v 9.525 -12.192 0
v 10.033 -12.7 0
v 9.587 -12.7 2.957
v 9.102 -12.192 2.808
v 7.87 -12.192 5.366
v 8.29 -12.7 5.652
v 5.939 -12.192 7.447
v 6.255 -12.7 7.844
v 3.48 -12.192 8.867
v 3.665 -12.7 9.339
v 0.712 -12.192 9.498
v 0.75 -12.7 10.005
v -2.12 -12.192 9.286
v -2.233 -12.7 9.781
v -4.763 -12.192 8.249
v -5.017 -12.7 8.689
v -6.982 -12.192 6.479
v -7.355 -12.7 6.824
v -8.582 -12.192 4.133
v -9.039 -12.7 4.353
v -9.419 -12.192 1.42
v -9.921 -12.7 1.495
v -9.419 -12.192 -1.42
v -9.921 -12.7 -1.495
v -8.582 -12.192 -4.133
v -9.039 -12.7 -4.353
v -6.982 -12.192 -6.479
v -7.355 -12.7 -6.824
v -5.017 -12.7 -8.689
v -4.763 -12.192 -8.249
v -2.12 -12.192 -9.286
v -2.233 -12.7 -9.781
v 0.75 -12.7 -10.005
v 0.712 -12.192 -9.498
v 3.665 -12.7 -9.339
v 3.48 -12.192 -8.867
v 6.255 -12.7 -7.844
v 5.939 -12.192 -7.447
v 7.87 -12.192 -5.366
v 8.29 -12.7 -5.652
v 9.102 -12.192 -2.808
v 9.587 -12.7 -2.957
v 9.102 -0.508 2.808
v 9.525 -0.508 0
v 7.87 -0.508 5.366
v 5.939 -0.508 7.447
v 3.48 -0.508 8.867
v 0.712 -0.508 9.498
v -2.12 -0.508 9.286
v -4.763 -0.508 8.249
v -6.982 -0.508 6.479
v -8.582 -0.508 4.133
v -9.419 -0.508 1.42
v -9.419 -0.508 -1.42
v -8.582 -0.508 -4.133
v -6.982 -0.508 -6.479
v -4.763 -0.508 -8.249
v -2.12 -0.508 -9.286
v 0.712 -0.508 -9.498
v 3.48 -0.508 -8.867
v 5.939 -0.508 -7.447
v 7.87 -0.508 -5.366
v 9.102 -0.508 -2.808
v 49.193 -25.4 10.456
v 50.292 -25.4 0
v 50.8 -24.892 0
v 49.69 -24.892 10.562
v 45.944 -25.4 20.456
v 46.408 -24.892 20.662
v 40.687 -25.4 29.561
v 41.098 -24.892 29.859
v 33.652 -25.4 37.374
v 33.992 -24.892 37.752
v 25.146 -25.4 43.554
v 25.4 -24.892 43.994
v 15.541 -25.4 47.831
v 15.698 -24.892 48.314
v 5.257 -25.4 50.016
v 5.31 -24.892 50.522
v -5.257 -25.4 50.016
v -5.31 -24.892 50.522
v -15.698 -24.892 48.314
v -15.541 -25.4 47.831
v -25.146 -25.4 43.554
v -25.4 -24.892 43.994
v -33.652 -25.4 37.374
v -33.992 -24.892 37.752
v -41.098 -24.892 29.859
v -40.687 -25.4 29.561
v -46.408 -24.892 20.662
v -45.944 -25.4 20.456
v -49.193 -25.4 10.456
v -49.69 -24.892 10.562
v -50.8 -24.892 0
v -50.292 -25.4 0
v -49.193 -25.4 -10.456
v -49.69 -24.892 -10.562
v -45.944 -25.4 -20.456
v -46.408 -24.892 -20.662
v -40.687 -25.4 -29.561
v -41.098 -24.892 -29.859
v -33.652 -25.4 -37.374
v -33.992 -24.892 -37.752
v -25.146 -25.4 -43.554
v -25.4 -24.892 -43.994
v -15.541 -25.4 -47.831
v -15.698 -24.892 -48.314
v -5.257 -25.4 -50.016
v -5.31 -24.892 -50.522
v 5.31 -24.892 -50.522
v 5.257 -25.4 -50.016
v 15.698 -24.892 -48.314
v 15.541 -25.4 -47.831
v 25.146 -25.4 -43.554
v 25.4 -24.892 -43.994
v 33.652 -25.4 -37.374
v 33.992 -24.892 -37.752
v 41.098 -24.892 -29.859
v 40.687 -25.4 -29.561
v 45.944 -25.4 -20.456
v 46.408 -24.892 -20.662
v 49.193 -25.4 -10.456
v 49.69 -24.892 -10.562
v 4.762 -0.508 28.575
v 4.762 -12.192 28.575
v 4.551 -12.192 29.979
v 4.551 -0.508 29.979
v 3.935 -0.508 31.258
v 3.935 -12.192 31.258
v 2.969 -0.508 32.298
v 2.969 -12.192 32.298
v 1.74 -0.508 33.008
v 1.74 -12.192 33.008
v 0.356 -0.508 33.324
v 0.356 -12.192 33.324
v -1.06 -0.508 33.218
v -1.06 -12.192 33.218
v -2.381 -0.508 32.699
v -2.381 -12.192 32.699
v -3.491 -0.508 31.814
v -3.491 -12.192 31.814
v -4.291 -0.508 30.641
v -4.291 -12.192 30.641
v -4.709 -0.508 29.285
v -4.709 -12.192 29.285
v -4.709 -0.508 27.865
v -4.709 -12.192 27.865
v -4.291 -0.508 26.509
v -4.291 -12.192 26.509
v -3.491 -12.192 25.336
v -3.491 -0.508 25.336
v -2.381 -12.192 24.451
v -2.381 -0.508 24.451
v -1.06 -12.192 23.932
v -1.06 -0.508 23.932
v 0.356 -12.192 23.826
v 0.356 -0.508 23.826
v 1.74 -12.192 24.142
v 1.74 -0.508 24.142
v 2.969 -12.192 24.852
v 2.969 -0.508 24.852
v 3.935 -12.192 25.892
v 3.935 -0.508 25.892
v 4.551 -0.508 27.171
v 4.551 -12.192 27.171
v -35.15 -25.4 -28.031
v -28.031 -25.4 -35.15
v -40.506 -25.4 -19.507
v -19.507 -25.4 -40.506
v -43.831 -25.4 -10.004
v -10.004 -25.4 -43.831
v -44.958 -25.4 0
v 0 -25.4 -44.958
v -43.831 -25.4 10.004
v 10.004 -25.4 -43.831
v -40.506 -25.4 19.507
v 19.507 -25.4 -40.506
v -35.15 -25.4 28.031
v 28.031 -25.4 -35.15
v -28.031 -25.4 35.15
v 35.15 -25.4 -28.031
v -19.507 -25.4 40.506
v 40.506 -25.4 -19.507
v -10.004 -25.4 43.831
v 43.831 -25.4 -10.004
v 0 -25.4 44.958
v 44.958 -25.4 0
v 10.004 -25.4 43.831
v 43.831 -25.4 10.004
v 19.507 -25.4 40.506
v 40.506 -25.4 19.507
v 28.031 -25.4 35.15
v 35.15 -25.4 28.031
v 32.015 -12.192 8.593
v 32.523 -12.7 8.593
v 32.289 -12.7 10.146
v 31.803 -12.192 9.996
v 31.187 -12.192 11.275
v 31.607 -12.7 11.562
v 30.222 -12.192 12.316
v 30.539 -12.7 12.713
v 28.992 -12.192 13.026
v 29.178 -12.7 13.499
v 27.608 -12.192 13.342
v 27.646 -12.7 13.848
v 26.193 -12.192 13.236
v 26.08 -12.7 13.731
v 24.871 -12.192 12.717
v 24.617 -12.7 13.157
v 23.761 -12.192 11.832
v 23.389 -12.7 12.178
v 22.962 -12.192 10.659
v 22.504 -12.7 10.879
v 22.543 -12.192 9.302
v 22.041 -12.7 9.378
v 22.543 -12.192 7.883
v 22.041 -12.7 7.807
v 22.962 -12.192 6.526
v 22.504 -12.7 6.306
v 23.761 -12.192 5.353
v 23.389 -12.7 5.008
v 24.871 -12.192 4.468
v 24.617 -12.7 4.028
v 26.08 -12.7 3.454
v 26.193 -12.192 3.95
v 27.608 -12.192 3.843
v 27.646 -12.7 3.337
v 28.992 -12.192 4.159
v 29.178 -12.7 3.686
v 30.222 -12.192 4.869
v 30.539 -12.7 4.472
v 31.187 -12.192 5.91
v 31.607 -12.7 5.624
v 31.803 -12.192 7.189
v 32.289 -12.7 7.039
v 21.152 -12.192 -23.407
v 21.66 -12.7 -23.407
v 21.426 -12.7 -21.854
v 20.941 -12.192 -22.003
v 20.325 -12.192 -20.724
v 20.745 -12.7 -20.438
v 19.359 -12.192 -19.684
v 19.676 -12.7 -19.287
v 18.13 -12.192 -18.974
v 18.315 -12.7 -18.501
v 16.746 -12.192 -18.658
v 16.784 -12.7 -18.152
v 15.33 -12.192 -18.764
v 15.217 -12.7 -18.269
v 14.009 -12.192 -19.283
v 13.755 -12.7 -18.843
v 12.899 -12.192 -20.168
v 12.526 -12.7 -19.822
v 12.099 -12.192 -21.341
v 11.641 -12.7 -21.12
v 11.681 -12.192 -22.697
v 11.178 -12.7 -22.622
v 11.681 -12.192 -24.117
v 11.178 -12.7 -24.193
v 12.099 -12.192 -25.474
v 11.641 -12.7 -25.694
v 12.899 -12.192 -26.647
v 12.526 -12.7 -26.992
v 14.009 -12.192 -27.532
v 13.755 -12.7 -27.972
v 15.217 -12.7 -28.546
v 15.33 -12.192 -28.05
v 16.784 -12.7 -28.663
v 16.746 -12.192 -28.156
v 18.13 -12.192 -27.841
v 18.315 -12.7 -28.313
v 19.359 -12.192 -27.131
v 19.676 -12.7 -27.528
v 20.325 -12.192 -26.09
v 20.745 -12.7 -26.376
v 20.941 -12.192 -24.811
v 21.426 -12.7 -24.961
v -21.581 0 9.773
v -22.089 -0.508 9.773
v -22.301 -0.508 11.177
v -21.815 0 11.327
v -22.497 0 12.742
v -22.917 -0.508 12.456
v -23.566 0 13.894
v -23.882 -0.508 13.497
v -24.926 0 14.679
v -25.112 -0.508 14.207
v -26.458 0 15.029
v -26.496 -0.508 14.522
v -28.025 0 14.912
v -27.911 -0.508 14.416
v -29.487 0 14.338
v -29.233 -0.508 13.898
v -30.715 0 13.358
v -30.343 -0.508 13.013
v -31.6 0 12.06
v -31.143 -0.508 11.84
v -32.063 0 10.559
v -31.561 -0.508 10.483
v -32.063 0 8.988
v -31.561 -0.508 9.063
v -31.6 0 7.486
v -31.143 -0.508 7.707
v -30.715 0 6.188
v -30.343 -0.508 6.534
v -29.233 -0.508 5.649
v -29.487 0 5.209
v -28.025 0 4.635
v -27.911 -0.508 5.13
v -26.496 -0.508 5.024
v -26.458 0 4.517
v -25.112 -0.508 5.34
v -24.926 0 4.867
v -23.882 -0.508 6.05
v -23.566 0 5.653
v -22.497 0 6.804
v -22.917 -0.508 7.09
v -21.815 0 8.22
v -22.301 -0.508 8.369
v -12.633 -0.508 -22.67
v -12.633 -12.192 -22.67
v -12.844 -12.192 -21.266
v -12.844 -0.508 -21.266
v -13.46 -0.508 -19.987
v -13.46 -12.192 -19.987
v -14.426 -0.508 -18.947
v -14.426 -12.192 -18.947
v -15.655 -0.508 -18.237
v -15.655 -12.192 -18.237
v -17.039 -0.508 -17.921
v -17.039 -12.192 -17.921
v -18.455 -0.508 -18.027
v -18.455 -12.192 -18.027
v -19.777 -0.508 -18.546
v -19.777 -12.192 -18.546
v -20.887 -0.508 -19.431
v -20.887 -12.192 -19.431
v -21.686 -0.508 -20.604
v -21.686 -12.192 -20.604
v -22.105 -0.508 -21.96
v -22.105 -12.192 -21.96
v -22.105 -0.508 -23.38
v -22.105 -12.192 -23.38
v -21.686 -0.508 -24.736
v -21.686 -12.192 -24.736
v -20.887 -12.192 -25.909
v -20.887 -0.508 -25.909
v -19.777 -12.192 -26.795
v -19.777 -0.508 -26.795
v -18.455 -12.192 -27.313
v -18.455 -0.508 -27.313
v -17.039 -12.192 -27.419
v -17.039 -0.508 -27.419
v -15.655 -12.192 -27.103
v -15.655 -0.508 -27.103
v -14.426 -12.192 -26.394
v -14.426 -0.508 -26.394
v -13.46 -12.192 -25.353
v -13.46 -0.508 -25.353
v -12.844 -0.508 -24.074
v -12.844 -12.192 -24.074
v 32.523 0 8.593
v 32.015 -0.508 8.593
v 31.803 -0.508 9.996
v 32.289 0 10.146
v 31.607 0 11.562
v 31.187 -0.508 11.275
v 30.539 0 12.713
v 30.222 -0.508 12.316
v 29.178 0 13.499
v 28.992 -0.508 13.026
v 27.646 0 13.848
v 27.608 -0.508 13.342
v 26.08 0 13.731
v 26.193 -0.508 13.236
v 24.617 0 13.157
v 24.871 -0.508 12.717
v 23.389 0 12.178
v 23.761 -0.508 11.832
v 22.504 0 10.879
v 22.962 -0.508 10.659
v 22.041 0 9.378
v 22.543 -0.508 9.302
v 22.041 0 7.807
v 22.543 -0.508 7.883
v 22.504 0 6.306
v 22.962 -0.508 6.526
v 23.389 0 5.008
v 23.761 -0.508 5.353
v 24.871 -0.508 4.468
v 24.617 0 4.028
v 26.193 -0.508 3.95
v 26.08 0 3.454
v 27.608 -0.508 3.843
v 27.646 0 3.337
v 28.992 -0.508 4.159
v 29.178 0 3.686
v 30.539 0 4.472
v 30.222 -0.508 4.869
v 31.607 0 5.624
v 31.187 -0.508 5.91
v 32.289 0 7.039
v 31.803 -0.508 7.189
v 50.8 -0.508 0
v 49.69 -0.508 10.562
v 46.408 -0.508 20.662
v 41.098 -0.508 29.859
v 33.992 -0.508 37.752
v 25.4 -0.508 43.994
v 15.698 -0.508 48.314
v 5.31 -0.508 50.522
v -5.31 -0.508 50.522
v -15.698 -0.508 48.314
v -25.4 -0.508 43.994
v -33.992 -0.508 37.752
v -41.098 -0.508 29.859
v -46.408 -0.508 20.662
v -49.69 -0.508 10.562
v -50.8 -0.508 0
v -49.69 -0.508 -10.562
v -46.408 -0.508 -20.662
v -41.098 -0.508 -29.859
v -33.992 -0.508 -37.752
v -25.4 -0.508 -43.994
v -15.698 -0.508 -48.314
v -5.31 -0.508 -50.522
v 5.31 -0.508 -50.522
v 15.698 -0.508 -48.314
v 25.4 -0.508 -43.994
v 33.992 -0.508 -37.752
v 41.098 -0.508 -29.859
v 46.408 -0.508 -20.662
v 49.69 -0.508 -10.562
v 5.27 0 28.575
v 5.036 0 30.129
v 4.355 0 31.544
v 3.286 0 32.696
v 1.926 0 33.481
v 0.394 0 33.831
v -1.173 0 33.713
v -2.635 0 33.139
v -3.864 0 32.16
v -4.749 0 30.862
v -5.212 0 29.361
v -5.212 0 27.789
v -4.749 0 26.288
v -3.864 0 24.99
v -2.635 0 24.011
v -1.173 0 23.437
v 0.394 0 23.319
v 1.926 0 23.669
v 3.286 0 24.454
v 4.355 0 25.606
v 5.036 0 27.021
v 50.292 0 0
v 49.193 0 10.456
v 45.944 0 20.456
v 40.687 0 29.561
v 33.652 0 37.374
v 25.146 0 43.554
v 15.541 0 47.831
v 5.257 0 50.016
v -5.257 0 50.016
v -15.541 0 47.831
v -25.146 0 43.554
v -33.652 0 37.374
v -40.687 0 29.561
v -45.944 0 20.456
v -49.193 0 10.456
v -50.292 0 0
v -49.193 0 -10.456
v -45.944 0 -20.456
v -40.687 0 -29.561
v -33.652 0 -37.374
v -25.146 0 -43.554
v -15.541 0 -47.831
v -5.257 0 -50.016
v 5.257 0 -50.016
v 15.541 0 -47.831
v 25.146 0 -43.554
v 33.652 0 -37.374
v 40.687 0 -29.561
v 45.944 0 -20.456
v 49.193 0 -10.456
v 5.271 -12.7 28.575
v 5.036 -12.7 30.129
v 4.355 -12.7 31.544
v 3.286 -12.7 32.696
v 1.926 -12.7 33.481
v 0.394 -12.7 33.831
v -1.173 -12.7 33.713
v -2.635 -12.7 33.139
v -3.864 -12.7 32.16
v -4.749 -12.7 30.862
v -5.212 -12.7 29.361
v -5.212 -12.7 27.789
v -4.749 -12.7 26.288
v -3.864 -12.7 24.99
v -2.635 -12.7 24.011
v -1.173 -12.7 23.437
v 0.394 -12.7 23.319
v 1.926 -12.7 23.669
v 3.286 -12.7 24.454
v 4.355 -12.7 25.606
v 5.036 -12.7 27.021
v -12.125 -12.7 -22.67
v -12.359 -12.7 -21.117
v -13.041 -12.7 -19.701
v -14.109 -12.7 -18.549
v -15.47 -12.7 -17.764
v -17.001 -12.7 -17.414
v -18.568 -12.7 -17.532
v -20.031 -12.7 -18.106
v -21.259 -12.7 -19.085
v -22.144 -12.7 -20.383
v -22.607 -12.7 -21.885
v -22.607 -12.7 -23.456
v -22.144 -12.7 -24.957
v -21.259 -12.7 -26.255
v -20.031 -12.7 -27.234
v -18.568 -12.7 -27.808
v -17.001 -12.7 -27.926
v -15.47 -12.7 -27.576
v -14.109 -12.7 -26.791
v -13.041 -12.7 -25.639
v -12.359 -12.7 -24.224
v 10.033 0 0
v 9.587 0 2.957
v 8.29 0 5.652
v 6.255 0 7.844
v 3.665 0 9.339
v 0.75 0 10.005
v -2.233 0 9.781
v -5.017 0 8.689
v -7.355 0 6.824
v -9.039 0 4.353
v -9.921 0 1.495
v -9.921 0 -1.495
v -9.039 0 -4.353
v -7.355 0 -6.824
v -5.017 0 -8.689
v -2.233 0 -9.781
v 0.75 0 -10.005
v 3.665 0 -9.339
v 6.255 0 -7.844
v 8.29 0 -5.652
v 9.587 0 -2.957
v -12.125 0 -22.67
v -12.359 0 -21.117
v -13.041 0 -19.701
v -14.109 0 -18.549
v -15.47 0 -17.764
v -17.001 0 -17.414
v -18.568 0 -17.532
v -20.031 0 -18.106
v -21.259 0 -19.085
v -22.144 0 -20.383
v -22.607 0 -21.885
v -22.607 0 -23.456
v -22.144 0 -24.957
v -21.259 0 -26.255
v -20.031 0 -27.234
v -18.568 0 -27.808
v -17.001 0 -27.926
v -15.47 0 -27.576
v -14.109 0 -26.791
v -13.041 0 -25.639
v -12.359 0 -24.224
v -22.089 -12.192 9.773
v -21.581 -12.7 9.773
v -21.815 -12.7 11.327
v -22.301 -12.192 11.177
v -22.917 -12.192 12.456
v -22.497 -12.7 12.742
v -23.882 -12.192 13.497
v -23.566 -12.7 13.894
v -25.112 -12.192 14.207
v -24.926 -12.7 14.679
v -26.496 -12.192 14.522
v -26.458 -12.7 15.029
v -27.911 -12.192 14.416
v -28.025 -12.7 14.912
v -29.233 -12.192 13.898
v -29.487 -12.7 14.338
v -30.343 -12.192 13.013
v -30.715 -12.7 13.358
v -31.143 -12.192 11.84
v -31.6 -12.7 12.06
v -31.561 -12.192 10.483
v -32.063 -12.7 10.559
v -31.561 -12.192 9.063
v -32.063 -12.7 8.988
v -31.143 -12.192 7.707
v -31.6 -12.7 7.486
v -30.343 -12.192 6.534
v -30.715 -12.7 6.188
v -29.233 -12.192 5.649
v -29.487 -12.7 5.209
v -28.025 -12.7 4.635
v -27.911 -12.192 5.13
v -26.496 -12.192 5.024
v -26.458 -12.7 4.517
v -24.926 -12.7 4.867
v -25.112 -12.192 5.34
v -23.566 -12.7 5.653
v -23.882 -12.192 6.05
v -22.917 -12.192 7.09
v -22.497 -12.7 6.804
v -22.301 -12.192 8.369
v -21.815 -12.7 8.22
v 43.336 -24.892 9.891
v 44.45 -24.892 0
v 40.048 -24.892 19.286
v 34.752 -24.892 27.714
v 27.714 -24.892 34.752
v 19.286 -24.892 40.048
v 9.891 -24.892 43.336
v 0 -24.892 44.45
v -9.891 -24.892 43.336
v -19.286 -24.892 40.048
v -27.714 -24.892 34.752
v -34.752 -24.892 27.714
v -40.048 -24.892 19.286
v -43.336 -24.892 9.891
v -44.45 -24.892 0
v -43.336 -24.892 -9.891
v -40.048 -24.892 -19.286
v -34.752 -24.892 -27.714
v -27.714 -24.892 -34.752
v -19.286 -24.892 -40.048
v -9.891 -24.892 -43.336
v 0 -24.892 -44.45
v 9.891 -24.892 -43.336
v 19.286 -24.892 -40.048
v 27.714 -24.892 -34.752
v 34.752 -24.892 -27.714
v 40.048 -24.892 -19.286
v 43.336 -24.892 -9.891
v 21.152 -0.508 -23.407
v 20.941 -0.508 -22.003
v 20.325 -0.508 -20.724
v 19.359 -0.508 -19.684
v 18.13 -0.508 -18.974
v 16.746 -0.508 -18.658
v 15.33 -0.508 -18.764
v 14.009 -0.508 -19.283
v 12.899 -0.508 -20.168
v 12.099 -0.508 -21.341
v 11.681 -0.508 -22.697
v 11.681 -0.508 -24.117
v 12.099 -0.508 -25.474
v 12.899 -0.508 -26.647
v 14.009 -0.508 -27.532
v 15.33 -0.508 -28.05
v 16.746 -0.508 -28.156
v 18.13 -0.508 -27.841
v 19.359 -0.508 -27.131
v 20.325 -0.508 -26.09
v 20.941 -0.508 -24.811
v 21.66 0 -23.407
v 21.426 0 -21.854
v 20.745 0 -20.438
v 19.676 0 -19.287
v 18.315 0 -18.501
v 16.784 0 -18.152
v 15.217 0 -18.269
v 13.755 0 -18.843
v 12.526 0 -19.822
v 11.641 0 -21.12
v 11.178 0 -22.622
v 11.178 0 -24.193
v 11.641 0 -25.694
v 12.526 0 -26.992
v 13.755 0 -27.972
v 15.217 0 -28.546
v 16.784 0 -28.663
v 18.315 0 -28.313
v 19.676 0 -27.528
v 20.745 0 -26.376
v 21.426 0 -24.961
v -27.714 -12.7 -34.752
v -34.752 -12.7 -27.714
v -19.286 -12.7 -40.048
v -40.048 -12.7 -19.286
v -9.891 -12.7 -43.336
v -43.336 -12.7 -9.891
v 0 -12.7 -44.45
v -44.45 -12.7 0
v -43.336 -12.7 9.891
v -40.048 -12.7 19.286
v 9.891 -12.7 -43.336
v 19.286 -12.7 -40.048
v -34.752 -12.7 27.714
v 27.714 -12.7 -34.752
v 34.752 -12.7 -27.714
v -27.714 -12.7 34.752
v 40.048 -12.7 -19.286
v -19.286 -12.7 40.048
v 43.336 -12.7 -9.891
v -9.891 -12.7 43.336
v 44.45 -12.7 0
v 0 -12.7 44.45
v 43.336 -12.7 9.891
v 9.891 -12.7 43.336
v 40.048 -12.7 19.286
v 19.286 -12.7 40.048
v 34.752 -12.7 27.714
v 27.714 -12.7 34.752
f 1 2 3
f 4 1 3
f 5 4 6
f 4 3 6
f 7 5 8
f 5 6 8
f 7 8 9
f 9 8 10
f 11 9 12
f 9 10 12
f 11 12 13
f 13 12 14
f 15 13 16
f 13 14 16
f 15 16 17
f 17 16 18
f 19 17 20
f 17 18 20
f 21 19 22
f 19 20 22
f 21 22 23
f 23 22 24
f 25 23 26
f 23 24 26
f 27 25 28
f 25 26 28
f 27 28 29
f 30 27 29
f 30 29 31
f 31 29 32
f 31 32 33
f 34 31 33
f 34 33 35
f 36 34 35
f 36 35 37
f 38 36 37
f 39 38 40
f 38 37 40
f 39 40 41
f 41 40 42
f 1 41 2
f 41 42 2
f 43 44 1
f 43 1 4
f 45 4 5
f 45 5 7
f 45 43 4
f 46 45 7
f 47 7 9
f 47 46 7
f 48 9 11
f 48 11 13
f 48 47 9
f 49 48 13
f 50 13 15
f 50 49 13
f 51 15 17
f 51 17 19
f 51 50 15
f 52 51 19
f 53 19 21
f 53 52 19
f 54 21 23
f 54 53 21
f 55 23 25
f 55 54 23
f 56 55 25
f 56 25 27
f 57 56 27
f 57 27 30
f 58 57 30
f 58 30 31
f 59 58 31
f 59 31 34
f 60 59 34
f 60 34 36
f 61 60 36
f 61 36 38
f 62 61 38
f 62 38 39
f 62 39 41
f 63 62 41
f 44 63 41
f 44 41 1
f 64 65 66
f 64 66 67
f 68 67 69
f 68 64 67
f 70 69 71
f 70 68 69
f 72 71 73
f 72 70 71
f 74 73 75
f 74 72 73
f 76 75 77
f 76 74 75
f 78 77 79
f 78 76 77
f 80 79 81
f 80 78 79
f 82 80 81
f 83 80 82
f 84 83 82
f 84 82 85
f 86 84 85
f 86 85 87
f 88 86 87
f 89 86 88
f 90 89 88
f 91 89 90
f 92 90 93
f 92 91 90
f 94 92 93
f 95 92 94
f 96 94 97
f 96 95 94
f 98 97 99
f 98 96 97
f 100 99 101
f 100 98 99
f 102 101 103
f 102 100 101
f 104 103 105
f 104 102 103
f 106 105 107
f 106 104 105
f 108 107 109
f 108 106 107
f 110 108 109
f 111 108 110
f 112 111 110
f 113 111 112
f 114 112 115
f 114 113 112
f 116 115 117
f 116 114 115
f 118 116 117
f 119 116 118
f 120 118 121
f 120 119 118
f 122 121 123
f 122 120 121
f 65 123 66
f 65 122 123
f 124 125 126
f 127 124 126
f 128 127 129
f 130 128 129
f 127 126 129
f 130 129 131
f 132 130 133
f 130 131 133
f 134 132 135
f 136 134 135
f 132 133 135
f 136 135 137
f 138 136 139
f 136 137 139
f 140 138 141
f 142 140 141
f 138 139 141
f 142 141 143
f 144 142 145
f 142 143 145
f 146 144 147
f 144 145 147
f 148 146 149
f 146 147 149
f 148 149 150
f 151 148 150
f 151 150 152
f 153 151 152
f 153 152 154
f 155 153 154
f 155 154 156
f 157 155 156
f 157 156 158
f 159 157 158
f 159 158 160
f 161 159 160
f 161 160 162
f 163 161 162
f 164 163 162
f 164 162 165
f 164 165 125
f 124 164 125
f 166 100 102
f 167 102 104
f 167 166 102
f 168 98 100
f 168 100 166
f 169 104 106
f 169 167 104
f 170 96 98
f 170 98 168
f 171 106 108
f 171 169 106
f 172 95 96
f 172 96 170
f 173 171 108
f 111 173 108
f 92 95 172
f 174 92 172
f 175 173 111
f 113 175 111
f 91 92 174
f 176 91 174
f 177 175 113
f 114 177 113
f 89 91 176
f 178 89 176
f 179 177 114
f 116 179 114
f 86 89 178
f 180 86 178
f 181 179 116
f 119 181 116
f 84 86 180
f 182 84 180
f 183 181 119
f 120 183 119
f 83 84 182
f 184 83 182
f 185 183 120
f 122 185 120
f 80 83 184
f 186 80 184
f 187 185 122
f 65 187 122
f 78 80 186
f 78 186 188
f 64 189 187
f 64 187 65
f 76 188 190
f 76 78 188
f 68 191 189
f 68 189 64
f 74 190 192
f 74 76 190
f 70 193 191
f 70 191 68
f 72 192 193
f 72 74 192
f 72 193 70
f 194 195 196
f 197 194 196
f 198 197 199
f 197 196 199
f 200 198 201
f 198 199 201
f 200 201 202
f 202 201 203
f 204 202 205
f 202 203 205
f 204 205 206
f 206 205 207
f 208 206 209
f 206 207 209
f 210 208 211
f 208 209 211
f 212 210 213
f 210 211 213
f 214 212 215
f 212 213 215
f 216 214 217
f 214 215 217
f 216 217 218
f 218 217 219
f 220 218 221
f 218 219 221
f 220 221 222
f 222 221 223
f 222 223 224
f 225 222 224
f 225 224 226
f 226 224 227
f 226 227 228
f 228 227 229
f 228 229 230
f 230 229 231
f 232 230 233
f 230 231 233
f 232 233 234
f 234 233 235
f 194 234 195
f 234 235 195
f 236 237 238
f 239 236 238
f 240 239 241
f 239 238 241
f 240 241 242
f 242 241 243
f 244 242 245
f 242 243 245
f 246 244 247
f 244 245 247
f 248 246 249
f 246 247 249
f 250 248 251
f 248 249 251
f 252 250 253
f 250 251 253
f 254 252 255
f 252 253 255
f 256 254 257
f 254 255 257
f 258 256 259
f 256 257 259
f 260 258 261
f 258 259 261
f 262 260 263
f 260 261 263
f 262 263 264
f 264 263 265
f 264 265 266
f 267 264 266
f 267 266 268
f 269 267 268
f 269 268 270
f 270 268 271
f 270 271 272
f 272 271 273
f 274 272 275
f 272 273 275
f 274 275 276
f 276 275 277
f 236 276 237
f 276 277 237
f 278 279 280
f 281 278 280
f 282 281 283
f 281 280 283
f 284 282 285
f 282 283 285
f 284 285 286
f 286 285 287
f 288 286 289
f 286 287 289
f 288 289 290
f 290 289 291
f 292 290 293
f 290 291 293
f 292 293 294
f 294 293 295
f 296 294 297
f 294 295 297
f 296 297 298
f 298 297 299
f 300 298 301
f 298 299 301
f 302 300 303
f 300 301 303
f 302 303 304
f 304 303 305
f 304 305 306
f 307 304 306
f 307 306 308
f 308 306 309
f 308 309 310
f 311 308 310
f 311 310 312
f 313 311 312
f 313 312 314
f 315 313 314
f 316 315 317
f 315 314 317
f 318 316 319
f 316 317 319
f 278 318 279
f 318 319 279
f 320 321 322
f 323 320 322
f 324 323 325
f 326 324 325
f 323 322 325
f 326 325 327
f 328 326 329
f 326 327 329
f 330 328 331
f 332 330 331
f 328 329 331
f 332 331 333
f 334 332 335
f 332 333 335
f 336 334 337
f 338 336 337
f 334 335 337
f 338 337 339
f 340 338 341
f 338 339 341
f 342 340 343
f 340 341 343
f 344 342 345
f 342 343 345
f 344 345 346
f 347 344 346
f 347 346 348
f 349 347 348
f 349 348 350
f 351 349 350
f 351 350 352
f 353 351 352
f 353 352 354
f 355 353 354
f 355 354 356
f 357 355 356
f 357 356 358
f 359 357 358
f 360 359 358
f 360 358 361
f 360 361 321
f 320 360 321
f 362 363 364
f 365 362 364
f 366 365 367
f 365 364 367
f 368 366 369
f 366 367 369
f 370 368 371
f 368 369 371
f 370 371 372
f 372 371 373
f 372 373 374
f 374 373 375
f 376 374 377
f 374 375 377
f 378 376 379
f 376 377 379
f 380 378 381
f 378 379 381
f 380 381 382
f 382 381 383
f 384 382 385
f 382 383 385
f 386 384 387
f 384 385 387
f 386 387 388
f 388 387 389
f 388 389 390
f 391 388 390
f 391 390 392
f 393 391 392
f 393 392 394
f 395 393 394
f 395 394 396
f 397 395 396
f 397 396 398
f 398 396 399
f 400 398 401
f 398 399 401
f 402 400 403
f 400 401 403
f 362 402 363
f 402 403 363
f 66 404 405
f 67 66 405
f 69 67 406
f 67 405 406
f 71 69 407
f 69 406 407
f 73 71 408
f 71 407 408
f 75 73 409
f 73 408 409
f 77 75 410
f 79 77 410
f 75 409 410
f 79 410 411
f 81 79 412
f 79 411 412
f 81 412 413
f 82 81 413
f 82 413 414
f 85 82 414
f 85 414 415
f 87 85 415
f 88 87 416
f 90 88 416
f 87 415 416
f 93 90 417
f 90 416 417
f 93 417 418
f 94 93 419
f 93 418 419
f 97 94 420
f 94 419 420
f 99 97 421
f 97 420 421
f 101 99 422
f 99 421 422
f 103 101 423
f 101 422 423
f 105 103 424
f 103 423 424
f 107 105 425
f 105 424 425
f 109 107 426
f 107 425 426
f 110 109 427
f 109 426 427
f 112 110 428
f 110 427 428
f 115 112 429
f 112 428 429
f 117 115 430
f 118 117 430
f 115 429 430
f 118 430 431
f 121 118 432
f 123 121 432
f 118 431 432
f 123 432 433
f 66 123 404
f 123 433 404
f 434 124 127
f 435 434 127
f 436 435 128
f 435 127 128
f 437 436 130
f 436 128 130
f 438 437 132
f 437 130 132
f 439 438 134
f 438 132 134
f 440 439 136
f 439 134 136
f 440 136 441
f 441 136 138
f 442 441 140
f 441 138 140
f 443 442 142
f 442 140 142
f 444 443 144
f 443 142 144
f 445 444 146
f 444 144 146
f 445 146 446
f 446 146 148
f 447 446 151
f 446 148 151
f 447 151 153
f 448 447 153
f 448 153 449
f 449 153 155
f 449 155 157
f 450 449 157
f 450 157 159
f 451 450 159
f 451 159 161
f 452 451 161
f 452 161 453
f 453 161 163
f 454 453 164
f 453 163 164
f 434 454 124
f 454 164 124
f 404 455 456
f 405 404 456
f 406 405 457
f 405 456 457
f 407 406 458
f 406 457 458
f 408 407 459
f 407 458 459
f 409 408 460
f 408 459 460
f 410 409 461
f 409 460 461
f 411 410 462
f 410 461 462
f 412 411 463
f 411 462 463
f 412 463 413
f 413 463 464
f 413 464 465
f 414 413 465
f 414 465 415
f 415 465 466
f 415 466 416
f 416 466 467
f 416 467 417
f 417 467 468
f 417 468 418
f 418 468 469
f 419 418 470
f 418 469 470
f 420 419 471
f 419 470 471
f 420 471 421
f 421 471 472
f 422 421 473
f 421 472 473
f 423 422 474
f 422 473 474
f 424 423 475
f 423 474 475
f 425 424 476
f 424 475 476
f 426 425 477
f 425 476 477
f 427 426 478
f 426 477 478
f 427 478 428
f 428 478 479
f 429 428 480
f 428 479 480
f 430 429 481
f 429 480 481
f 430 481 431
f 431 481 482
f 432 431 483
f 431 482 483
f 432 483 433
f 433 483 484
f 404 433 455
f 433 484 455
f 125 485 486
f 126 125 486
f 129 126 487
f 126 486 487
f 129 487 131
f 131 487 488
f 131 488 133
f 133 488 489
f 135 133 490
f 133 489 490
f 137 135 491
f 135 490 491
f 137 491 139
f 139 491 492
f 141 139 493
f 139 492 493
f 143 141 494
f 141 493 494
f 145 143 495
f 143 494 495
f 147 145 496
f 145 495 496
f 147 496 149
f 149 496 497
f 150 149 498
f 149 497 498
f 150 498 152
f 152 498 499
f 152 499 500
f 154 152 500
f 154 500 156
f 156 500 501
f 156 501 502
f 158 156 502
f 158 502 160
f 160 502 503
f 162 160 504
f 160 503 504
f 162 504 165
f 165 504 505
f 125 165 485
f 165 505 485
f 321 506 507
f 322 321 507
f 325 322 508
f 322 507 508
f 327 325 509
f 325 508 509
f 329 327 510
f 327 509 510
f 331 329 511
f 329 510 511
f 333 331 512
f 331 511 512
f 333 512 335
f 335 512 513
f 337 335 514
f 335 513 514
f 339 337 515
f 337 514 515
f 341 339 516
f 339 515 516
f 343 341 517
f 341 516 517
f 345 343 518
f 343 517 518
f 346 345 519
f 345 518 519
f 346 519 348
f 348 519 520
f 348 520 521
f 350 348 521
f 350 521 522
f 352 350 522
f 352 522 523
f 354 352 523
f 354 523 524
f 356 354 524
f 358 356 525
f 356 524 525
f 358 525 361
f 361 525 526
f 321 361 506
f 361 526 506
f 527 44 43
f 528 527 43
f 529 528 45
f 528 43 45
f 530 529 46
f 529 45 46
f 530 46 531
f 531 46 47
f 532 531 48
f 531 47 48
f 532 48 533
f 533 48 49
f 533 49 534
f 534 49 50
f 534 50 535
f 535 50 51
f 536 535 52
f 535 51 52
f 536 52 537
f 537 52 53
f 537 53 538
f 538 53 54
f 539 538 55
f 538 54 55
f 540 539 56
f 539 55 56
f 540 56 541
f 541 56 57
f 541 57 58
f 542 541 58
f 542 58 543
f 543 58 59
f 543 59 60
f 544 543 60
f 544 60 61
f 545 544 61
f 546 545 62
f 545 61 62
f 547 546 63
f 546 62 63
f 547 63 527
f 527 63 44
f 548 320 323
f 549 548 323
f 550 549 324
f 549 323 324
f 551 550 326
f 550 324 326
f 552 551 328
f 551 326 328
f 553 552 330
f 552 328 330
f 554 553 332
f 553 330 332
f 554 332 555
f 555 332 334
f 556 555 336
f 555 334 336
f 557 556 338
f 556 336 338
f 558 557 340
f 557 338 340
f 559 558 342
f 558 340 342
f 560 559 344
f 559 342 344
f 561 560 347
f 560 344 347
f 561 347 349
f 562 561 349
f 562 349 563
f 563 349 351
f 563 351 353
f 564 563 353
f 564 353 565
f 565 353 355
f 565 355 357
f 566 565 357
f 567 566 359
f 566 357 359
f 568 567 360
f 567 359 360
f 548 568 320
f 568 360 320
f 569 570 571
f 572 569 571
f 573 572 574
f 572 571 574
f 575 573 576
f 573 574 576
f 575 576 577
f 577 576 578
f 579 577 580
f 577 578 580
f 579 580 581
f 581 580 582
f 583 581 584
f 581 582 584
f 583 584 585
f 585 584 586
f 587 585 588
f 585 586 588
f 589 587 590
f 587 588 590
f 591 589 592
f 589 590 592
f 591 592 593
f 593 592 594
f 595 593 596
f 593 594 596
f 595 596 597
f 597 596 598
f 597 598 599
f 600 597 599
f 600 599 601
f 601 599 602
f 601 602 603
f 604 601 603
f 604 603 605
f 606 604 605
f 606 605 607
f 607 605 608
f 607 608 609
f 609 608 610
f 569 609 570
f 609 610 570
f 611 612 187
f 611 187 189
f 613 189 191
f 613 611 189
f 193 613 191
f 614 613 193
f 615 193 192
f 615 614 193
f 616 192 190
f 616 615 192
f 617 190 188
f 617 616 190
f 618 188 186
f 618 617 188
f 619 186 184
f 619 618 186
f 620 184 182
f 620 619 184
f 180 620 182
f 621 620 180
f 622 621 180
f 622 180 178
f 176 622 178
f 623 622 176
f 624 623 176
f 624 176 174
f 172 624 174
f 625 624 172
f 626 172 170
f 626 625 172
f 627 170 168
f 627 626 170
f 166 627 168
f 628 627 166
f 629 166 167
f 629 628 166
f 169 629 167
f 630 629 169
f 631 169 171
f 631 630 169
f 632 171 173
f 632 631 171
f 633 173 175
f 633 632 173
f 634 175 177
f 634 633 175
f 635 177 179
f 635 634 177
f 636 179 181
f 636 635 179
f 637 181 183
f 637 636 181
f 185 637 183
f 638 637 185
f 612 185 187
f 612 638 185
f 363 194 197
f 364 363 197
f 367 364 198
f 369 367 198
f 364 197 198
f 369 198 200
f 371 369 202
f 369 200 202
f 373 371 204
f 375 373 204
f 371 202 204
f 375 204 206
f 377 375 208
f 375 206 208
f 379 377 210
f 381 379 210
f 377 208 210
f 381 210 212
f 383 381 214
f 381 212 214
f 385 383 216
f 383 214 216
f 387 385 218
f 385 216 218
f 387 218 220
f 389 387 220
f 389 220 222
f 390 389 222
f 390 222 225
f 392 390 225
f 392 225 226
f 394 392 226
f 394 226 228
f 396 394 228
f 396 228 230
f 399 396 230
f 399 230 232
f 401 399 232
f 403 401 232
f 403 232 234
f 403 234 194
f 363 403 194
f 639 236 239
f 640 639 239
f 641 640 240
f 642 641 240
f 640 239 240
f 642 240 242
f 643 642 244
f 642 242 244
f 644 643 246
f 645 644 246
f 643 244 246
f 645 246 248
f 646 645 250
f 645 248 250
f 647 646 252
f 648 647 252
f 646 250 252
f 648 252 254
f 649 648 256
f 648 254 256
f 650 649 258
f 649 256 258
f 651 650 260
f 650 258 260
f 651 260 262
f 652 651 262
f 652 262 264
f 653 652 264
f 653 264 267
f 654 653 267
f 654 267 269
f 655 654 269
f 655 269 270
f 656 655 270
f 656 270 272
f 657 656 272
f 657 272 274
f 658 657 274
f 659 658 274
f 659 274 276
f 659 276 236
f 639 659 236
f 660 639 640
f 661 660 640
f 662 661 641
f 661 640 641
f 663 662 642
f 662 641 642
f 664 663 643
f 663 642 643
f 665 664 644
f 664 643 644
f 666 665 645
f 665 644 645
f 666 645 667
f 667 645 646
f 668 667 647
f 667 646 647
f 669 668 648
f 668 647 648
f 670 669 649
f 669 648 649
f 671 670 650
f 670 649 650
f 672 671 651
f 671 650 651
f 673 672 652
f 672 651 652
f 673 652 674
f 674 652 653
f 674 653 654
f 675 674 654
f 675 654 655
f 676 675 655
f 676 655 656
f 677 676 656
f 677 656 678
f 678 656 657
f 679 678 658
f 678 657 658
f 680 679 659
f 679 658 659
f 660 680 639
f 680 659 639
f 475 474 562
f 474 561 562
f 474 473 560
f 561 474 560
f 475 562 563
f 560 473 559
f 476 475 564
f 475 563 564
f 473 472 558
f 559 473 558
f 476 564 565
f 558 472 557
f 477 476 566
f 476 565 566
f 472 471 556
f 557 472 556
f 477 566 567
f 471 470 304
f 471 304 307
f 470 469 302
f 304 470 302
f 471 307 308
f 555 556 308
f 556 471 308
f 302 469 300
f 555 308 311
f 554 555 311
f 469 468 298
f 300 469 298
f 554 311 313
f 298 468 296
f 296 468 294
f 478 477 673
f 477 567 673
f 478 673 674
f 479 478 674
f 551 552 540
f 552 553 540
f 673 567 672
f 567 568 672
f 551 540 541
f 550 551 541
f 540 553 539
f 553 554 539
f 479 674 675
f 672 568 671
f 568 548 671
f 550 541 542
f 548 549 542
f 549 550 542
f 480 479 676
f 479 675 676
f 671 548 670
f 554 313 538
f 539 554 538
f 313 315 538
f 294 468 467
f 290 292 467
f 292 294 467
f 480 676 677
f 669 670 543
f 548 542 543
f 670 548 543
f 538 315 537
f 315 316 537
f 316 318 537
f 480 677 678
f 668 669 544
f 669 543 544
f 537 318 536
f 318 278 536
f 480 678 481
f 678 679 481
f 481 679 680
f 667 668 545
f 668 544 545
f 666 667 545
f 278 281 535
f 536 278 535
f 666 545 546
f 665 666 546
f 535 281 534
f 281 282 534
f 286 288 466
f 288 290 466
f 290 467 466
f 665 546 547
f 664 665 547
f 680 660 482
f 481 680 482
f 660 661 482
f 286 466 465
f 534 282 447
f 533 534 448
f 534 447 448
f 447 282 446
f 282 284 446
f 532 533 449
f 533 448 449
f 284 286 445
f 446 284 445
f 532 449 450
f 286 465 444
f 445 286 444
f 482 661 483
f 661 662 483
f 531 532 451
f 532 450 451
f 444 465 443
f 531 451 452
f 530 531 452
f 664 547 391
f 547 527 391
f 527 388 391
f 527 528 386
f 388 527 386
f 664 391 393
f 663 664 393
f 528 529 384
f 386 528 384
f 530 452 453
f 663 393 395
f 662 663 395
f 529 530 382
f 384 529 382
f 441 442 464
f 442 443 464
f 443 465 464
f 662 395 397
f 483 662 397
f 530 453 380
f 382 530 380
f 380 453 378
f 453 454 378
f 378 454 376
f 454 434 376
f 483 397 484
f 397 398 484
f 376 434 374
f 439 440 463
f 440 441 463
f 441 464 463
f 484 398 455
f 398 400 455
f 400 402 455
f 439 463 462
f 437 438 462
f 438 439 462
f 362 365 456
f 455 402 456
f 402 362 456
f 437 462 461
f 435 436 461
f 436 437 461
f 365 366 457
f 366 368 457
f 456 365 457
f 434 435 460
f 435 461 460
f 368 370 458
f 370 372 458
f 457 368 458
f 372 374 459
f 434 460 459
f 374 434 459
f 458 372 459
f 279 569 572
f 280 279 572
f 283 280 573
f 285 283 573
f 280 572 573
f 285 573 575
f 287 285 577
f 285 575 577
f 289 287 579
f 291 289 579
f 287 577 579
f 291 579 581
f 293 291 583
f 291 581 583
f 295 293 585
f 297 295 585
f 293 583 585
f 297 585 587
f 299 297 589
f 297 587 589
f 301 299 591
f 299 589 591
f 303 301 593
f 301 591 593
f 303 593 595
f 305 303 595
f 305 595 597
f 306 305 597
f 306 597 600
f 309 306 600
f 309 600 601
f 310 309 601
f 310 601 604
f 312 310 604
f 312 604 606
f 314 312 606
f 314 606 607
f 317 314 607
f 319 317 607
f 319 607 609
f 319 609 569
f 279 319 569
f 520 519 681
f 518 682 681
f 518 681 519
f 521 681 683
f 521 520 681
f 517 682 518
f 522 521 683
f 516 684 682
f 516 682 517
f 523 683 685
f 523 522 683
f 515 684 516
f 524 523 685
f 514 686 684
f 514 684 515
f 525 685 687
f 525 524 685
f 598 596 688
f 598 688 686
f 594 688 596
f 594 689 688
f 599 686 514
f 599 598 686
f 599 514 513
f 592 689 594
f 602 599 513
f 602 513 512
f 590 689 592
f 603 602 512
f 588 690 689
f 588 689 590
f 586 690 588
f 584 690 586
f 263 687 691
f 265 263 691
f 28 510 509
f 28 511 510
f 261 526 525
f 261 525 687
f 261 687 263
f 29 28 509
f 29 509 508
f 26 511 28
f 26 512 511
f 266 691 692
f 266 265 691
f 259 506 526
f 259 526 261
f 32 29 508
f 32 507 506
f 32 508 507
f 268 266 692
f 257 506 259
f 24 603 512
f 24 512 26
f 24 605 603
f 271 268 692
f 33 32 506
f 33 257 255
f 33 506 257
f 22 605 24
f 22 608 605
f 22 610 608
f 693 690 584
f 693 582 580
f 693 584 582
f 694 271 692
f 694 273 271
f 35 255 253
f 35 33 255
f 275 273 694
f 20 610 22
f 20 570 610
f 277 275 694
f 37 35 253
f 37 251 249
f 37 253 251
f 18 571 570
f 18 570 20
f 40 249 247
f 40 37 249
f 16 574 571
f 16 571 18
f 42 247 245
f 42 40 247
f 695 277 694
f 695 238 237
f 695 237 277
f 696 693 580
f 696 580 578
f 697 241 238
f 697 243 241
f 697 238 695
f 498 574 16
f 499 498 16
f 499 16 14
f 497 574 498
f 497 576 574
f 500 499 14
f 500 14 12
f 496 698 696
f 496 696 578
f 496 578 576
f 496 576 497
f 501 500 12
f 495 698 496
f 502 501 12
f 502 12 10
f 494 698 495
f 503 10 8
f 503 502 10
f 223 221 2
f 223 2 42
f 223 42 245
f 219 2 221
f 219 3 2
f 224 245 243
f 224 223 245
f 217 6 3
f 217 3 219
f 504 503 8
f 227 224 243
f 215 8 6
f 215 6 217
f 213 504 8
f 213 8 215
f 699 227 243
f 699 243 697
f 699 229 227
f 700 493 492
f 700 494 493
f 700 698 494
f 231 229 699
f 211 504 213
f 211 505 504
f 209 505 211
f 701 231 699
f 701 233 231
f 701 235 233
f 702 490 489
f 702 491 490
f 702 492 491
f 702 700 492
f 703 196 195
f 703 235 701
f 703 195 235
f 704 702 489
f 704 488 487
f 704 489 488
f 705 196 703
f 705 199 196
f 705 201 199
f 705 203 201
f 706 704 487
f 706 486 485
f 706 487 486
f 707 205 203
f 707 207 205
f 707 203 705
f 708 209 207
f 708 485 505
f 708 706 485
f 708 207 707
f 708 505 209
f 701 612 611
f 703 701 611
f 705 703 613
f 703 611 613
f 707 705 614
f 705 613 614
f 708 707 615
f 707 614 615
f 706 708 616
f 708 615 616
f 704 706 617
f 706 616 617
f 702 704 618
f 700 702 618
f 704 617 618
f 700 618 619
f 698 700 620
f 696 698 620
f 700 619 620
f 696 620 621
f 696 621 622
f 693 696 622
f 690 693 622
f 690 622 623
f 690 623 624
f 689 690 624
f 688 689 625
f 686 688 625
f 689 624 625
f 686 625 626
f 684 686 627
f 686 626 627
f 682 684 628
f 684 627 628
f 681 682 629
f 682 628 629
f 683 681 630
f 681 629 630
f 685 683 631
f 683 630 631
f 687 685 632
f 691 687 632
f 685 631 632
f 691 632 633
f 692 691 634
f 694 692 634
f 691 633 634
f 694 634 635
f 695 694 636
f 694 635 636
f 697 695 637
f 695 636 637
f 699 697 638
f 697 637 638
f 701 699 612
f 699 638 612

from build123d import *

# Parameters (mm, degrees)
F0_R     = 50.8
F0_R_2   = 9.525
F1_DEPTH = 25.4
F2_R     = 44.45
F2_R_2   = 9.525
F3_DEPTH = 12.7
F4_R     = 4.7625
F5_DEPTH = 12.701
F6_SIZE  = 0.508


with BuildPart() as f1:
    # F0 (on Front) → F1 (new body)
    with BuildSketch(Plane.XZ):
        Circle(F0_R)
        Circle(F0_R_2, mode=Mode.SUBTRACT)
    extrude(amount=F1_DEPTH)

    # F2 (on face) → F3 (cut)
    with BuildSketch(Plane.XZ.offset(25.4)):
        Circle(F2_R)
        Circle(F2_R_2, mode=Mode.SUBTRACT)
    extrude(amount=-F3_DEPTH, mode=Mode.SUBTRACT)

    # F4 (on face) → F5 (cut, through all)
    with BuildSketch(Plane.XZ.offset(12.7)):
        with Locations((-26.851716639, 9.7732255955)):
            Circle(F4_R)
        with Locations((0, 28.575)):
            Circle(F4_R)
        with Locations((27.2524618676, 8.5926682208)):
            Circle(F4_R)
        with Locations((16.3899466687, -23.4072696656)):
            Circle(F4_R)
        with Locations((-17.3953578339, -22.6700716988)):
            Circle(F4_R)
    extrude(amount=-F5_DEPTH, mode=Mode.SUBTRACT)

    # F6
    f6_edges = [f1.edges().sort_by_distance(p)[0] for p in [
        (-44.45, -25.4, 0),
        (-4.7625, -12.7, 28.575),
        (-31.614217, -12.7, 9.773226),
        (-9.525, -12.7, 0),
        (-22.157858, -12.7, -22.670072),
        (-50.8, 0, 0),
        (11.627447, -12.7, -23.40727),
        (22.489962, -12.7, 8.592668),
        (-50.8, -25.4, 0),
        (-4.7625, 0, 28.575),
        (-31.614217, 0, 9.773226),
        (-22.157858, 0, -22.670072),
        (11.627447, 0, -23.40727),
        (22.489962, 0, 8.592668),
        (-9.525, 0, 0),
    ]]
    chamfer(f6_edges, length=F6_SIZE)


solid = f1.part
